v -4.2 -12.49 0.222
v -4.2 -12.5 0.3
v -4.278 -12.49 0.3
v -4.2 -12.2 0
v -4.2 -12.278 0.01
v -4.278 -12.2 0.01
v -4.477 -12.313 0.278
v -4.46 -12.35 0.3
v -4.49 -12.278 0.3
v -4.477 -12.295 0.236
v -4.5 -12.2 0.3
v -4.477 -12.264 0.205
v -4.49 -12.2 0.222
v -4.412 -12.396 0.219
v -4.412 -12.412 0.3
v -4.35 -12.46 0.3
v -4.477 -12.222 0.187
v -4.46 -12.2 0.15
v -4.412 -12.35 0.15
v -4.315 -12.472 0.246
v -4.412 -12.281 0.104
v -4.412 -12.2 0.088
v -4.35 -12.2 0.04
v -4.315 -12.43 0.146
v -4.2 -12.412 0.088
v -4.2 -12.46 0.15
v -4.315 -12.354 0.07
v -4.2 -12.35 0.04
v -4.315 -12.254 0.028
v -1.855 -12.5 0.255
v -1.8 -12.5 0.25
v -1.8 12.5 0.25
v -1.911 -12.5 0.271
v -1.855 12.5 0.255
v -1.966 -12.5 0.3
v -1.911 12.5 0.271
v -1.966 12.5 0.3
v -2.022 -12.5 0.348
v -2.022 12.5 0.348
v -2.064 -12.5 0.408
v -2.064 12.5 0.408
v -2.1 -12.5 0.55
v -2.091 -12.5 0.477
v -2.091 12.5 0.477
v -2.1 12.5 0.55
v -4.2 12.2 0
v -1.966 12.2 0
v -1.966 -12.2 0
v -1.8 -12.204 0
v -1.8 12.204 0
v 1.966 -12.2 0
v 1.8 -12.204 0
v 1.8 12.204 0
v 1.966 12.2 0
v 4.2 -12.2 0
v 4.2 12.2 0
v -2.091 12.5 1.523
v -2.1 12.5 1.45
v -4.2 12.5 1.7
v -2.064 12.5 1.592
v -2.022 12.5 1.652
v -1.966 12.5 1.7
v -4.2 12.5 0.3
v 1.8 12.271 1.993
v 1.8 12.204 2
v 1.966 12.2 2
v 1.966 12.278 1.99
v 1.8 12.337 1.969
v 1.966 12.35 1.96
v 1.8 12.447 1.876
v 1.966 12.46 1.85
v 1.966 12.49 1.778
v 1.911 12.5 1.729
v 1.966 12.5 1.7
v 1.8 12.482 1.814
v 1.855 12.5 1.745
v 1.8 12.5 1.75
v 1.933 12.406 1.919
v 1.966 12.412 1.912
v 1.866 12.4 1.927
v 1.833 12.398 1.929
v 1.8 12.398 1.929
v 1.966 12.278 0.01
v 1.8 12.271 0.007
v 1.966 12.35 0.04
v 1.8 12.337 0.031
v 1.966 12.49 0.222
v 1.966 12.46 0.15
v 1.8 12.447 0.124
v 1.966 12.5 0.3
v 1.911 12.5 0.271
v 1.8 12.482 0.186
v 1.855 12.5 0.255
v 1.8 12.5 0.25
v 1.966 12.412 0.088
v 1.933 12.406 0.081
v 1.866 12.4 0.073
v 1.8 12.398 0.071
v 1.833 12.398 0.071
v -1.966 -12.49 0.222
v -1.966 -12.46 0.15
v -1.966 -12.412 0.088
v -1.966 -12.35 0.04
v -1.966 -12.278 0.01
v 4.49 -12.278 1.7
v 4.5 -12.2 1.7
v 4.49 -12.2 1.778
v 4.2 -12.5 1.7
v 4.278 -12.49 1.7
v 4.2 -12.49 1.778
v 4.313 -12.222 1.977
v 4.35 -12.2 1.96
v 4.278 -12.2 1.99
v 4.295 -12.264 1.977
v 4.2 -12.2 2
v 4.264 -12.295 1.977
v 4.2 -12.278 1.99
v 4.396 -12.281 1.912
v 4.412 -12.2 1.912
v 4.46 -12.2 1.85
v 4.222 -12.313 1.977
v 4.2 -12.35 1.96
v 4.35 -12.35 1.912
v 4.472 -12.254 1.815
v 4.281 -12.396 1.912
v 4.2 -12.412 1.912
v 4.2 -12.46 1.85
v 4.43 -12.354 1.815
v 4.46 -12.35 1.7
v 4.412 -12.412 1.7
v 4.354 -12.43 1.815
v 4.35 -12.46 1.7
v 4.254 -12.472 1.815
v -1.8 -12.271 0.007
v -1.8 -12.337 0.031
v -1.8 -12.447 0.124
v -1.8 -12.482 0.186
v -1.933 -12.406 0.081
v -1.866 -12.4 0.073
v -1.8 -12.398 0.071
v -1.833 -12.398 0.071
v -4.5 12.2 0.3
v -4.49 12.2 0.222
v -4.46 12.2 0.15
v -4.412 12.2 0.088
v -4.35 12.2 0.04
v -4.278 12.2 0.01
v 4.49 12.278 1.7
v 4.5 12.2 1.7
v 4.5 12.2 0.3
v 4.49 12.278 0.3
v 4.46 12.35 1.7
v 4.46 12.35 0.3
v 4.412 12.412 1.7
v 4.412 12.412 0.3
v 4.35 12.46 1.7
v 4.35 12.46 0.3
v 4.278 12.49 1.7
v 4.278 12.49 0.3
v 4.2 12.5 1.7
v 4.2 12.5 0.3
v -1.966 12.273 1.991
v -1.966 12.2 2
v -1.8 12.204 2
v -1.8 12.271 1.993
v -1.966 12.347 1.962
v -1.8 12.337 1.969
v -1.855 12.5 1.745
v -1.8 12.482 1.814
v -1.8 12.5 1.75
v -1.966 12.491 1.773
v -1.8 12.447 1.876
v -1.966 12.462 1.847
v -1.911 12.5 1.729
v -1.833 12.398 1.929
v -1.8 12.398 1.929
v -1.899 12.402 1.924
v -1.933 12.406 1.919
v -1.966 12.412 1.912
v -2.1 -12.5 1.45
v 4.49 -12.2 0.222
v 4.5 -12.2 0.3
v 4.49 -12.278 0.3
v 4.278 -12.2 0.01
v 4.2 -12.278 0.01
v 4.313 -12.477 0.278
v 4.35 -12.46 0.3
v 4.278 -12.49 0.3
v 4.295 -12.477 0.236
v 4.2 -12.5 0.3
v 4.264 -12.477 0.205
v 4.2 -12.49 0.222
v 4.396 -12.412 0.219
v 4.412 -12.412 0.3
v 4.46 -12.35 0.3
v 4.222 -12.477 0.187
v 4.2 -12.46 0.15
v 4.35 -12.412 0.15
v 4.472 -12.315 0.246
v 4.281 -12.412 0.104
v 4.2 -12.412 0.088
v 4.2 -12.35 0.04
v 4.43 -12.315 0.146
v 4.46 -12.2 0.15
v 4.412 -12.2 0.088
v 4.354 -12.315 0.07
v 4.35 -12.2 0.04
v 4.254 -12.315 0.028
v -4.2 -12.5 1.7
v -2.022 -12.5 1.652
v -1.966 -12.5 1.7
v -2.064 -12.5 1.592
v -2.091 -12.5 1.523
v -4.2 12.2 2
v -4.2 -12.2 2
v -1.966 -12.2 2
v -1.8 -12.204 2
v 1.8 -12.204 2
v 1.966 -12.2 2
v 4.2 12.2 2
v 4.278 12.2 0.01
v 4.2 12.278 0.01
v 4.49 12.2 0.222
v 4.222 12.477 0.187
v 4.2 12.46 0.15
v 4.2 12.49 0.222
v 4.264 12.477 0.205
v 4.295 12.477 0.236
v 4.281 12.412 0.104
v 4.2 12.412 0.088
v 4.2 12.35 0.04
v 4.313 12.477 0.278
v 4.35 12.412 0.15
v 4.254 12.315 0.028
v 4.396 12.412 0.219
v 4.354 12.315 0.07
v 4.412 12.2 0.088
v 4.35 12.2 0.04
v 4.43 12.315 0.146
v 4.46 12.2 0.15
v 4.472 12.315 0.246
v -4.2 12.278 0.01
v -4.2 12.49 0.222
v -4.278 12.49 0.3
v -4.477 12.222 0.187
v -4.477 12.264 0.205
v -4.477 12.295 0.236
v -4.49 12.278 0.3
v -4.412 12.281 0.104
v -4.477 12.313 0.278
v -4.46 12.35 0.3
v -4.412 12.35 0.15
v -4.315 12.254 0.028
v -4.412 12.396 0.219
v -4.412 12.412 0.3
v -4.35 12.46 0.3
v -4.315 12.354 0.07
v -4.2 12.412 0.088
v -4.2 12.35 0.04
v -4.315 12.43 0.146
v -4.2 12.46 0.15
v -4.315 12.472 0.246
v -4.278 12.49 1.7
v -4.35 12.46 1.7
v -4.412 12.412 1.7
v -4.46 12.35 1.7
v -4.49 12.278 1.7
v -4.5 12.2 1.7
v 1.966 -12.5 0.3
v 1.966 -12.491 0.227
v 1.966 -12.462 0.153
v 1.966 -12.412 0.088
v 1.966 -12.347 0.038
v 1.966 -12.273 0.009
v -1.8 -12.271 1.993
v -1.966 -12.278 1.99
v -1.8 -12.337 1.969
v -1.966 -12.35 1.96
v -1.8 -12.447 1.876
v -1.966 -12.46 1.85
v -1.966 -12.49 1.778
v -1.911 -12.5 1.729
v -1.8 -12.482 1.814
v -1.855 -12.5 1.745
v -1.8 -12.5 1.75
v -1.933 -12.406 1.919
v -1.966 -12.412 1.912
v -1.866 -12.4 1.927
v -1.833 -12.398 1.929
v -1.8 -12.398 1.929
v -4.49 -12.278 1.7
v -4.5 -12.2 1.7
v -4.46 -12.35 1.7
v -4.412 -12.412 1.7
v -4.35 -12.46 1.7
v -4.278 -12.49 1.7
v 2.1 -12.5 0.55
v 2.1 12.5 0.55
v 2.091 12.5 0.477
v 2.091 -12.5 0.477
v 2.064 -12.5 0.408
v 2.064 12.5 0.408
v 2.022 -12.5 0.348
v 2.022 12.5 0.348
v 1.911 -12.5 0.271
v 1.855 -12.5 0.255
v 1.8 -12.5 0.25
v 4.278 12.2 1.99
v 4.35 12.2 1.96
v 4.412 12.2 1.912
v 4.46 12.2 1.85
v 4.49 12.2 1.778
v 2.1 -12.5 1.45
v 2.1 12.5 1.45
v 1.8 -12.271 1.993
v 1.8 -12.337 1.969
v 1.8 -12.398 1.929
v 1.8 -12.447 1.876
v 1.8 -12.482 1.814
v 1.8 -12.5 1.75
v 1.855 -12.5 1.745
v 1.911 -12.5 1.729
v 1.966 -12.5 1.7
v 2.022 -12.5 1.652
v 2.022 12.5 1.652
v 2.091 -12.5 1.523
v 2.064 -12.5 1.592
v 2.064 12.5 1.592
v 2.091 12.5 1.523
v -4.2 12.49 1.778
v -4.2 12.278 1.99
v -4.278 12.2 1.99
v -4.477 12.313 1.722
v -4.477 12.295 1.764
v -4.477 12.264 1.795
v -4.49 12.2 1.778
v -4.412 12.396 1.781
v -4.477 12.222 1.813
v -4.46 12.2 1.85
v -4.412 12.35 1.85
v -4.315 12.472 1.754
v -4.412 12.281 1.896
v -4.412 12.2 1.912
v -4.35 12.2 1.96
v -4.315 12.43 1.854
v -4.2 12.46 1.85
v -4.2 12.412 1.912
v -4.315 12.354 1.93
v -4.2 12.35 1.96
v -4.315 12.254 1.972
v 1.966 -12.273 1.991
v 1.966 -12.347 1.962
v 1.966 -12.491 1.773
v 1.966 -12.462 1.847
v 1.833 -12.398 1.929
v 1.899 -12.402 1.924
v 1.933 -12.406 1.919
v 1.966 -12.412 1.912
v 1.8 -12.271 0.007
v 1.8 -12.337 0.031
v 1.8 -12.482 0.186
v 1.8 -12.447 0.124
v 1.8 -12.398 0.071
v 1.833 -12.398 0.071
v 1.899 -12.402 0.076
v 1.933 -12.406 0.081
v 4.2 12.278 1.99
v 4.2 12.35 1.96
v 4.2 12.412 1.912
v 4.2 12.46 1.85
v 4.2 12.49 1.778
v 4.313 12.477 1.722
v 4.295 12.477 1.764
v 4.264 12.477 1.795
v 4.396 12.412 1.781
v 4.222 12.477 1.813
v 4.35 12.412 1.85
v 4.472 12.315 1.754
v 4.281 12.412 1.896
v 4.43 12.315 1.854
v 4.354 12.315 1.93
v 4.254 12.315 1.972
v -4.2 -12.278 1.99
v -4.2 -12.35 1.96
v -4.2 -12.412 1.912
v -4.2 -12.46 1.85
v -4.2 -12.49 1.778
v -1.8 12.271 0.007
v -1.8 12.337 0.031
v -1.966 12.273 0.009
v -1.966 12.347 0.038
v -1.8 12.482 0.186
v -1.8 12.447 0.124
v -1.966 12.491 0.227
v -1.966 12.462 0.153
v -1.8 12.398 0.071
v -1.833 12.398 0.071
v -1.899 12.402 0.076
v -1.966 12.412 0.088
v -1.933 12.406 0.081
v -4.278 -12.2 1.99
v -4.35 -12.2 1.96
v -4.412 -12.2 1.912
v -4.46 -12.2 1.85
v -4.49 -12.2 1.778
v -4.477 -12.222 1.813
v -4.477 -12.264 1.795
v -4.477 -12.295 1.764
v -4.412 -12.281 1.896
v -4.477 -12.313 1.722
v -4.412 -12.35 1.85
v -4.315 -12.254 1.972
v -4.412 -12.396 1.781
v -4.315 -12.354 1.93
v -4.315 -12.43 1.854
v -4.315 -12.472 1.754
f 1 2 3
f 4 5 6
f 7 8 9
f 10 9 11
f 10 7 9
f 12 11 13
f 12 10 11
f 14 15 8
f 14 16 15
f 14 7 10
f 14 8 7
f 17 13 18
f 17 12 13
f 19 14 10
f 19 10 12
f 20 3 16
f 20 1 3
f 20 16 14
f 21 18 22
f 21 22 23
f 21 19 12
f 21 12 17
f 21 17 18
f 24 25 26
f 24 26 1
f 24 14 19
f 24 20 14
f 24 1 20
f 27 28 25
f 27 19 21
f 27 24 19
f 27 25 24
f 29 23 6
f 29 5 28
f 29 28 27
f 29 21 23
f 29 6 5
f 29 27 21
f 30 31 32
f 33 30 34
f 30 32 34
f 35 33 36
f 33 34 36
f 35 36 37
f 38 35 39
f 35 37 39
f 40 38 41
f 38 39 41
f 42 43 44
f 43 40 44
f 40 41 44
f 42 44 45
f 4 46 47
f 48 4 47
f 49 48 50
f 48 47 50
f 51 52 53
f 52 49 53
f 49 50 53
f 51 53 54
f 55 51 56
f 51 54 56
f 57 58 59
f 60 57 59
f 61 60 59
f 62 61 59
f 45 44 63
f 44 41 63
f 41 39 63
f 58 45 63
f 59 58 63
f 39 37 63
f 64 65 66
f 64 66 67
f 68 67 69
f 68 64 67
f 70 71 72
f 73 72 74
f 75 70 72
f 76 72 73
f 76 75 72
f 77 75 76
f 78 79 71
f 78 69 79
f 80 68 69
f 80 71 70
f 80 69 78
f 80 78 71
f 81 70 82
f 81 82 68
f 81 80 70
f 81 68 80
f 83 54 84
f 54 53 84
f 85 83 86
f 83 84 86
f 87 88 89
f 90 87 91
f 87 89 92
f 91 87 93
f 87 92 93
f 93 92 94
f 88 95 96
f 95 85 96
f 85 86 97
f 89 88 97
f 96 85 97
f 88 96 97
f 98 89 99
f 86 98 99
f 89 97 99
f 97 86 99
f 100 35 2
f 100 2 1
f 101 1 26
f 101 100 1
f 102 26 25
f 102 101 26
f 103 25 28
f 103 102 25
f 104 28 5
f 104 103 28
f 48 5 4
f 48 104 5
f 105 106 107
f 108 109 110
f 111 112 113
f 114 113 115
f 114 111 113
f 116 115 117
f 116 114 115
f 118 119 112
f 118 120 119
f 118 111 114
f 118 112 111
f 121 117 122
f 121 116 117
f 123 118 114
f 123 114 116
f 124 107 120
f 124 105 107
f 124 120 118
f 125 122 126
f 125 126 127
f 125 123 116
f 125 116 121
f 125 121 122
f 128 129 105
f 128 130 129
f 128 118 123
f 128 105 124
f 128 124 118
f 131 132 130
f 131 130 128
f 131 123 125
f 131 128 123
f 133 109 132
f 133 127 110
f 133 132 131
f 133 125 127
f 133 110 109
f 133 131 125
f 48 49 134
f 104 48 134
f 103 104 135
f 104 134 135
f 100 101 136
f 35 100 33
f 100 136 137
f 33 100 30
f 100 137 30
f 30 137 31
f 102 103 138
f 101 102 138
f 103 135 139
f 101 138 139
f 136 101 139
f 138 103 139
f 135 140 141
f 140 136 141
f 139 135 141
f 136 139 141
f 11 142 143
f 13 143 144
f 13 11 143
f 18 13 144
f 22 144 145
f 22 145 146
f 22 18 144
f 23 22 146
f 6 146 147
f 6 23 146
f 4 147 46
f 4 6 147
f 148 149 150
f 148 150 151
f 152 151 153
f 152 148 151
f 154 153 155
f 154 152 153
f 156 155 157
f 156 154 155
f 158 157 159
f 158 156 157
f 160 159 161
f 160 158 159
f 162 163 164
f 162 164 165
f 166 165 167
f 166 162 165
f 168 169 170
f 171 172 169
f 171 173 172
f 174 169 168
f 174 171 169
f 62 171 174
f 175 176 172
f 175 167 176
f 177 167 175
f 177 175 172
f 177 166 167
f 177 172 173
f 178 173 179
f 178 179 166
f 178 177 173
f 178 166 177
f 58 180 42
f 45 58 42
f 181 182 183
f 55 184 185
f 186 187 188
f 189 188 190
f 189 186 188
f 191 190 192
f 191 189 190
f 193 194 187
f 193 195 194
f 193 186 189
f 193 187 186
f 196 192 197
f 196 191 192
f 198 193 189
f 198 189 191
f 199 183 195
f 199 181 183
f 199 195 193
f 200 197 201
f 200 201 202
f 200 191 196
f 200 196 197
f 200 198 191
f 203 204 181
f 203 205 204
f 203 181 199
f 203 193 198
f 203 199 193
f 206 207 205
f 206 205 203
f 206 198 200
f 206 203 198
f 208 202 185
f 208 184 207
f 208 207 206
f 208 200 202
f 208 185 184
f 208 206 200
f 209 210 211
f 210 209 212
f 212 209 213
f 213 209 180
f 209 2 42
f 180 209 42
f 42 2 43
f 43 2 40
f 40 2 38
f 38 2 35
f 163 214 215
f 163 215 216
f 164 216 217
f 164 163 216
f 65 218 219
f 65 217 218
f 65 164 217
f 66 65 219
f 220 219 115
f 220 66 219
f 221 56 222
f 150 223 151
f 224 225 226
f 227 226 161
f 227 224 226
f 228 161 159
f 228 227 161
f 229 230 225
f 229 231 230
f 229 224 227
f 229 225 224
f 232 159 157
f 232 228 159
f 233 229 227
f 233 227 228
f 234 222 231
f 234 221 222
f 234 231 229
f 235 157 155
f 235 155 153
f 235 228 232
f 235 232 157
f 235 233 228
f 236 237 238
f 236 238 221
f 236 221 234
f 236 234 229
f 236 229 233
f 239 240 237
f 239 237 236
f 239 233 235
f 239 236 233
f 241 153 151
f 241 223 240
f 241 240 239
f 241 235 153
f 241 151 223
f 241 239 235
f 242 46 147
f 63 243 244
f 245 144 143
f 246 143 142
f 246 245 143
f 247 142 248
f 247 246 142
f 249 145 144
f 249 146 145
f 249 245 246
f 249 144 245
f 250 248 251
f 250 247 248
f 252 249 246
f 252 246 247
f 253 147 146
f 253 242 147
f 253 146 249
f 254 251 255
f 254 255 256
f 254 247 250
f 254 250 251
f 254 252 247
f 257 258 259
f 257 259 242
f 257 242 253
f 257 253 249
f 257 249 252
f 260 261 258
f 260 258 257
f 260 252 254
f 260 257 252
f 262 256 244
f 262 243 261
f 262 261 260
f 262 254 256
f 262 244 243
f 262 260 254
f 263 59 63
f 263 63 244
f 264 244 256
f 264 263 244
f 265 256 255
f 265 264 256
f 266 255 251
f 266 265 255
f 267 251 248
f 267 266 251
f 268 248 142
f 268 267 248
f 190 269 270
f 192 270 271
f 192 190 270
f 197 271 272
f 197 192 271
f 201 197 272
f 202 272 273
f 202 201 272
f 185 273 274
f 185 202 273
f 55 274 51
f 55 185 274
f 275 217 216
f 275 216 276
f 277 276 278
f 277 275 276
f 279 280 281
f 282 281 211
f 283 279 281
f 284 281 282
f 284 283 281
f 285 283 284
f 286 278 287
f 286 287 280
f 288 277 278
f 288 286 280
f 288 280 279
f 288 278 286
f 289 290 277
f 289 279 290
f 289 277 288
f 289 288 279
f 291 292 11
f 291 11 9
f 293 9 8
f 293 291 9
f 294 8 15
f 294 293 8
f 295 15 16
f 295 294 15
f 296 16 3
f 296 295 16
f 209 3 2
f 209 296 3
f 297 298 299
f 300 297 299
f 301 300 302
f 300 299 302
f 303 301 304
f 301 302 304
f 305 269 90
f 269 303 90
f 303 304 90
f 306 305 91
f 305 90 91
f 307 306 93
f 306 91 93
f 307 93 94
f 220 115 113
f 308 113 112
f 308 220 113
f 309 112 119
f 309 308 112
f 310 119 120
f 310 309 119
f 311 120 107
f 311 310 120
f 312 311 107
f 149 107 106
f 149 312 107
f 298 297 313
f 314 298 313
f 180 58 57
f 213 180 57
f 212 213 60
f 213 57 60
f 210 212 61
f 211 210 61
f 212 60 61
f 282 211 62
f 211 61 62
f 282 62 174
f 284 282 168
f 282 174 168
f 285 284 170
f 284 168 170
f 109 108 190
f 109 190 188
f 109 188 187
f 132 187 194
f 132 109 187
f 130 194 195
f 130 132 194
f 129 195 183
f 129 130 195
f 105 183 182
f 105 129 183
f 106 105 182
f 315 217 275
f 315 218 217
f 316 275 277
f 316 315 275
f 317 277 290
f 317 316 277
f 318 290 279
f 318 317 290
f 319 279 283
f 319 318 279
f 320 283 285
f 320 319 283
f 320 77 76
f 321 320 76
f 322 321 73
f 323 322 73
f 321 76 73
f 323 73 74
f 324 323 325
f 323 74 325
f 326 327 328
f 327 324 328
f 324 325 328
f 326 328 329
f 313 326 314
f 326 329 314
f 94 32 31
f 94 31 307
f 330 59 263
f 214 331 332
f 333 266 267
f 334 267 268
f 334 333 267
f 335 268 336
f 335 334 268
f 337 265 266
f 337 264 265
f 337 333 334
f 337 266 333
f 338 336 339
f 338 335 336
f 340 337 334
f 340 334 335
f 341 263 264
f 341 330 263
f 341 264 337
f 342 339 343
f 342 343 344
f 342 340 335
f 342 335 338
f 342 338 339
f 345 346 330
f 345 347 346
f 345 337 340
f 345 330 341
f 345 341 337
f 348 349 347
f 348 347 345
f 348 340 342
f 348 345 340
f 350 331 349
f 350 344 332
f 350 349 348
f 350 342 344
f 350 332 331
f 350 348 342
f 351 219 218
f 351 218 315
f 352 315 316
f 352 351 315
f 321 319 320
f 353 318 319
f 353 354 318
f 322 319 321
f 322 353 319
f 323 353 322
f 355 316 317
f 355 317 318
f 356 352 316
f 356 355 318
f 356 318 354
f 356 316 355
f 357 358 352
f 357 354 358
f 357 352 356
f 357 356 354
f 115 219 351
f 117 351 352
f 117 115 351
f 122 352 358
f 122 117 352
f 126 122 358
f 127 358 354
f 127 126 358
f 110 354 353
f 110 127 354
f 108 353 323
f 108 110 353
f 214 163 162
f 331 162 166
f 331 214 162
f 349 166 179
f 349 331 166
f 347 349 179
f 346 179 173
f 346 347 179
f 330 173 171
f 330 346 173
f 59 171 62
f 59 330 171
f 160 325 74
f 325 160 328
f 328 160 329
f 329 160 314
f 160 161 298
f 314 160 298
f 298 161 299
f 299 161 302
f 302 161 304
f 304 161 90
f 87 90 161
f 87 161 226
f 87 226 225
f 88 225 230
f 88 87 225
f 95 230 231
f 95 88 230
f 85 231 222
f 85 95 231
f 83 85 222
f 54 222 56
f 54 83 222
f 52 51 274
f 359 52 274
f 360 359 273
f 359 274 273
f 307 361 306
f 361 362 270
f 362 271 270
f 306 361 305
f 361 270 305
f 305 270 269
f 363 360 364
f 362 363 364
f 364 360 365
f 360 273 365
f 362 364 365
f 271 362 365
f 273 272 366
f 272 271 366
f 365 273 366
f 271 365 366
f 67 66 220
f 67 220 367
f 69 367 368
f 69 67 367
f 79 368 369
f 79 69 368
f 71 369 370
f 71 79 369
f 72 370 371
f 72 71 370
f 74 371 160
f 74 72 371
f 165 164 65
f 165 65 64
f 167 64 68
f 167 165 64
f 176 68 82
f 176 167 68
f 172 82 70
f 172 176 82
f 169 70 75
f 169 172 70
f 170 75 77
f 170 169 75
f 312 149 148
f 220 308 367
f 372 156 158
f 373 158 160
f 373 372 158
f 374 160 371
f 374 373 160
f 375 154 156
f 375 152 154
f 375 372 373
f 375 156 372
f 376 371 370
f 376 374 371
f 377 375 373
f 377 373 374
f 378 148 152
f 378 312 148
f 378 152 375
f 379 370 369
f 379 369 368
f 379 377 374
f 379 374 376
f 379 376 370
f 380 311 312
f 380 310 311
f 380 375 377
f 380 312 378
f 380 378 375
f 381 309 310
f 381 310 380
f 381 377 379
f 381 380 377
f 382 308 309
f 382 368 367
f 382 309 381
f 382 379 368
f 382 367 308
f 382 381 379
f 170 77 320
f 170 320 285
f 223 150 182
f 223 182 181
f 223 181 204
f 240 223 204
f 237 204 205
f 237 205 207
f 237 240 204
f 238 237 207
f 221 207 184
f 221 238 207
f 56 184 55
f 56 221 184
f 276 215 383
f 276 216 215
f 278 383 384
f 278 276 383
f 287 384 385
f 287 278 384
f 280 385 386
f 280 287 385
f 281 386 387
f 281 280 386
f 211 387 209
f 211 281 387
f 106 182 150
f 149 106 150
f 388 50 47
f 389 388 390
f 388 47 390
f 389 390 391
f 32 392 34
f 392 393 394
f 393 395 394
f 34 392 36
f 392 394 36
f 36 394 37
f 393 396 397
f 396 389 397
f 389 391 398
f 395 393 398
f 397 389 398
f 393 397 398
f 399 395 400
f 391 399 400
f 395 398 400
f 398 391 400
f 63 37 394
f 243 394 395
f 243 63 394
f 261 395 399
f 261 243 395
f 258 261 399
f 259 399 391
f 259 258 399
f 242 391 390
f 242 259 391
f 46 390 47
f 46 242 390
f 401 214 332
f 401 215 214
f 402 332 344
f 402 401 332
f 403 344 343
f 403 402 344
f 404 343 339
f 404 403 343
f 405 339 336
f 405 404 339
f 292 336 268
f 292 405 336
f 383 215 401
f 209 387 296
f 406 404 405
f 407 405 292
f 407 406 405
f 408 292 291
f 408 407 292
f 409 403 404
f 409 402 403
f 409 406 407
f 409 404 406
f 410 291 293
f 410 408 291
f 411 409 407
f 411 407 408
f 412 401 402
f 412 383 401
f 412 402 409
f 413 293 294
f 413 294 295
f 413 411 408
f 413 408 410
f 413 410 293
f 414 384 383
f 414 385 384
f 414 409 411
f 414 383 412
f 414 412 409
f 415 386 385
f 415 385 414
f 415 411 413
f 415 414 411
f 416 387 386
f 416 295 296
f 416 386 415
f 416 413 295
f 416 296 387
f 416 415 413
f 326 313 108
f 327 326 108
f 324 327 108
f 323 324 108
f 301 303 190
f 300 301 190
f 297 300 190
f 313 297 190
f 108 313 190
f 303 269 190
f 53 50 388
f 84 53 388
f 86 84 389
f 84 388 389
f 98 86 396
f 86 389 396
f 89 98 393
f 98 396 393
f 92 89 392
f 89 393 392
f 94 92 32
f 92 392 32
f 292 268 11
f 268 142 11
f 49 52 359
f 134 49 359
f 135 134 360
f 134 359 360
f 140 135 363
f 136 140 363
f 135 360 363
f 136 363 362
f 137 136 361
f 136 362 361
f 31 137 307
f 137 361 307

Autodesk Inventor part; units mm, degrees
ref_plane "YZ Plane" through (0, 0, 0) normal (1, 0, 0) x (0, 1, 0)
ref_plane "XZ Plane" through (0, 0, 0) normal (0, 1, 0) x (-1, 0, 0)
ref_plane "XY Plane" through (0, 0, 0) normal (0, 0, 1) x (1, 0, 0)
sketch "Sketch1" plane through (0, 0, 0) normal (0, 0, 1) x (1, 0, 0)
  line L0 (-4.5, -12.5) -> (4.5, -12.5)
  line L1 (4.5, -12.5) -> (4.5, 12.5)
  line L2 (4.5, 12.5) -> (-4.5, 12.5)
  line L3 (-4.5, 12.5) -> (-4.5, -12.5)
  line L4 (-4.5, -12.5) -> (4.5, 12.5) construction
  line L5 (4.5, -12.5) -> (-4.5, 12.5) construction
  point P0 (0, 0)
  dimension "d0" = 9
  dimension "d1" = 25
extrude "Extrusion1" add sketch "Sketch1" along normal blind 2
sketch "Sketch2" plane through (-4.5, -12.5, 0) normal (0, -1, 0) x (1, 0, 0)
  line L0 (4.5, 0) -> (4.5, 2) construction
  line L1 (9, 2) -> (0, 2) construction
  line L2 (0, 0) -> (0, 2) construction
  line L3 (0, 1) -> (9, 1) construction
  line L4 (2.4, 0.25) -> (6.6, 0.25)
  line L5 (6.6, 0.25) -> (6.6, 1.75)
  line L6 (6.6, 1.75) -> (2.4, 1.75)
  line L7 (2.4, 1.75) -> (2.4, 0.25)
  line L8 (2.4, 0.25) -> (6.6, 1.75) construction
  line L9 (6.6, 0.25) -> (2.4, 1.75) construction
  point P0 (4.5, 1)
  dimension "d4" = 4.2
  dimension "d5" = 1.5
extrude "Extrusion2" cut sketch "Sketch2" against normal blind 254
fillet "Fillet1" radius 0.3 4 edges at (-2.1, 0, 0.25) (2.1, 0, 0.25) (-2.1, 0, 1.75) (2.1, 0, 1.75)
fillet "Fillet2" radius 0.3 12 edges at (4.5, 0, 0) (4.5, -12.5, 1) (4.5, 0, 2) (0, -12.5, 0) (0, -12.5, 2) (4.5, 12.5, 1) (0, 12.5, 0) (0, 12.5, 2) (-4.5, 12.5, 1) (-4.5, 0, 0) (-4.5, 0, 2) (-4.5, -12.5, 1)
properties part number "OTOSGuard"
